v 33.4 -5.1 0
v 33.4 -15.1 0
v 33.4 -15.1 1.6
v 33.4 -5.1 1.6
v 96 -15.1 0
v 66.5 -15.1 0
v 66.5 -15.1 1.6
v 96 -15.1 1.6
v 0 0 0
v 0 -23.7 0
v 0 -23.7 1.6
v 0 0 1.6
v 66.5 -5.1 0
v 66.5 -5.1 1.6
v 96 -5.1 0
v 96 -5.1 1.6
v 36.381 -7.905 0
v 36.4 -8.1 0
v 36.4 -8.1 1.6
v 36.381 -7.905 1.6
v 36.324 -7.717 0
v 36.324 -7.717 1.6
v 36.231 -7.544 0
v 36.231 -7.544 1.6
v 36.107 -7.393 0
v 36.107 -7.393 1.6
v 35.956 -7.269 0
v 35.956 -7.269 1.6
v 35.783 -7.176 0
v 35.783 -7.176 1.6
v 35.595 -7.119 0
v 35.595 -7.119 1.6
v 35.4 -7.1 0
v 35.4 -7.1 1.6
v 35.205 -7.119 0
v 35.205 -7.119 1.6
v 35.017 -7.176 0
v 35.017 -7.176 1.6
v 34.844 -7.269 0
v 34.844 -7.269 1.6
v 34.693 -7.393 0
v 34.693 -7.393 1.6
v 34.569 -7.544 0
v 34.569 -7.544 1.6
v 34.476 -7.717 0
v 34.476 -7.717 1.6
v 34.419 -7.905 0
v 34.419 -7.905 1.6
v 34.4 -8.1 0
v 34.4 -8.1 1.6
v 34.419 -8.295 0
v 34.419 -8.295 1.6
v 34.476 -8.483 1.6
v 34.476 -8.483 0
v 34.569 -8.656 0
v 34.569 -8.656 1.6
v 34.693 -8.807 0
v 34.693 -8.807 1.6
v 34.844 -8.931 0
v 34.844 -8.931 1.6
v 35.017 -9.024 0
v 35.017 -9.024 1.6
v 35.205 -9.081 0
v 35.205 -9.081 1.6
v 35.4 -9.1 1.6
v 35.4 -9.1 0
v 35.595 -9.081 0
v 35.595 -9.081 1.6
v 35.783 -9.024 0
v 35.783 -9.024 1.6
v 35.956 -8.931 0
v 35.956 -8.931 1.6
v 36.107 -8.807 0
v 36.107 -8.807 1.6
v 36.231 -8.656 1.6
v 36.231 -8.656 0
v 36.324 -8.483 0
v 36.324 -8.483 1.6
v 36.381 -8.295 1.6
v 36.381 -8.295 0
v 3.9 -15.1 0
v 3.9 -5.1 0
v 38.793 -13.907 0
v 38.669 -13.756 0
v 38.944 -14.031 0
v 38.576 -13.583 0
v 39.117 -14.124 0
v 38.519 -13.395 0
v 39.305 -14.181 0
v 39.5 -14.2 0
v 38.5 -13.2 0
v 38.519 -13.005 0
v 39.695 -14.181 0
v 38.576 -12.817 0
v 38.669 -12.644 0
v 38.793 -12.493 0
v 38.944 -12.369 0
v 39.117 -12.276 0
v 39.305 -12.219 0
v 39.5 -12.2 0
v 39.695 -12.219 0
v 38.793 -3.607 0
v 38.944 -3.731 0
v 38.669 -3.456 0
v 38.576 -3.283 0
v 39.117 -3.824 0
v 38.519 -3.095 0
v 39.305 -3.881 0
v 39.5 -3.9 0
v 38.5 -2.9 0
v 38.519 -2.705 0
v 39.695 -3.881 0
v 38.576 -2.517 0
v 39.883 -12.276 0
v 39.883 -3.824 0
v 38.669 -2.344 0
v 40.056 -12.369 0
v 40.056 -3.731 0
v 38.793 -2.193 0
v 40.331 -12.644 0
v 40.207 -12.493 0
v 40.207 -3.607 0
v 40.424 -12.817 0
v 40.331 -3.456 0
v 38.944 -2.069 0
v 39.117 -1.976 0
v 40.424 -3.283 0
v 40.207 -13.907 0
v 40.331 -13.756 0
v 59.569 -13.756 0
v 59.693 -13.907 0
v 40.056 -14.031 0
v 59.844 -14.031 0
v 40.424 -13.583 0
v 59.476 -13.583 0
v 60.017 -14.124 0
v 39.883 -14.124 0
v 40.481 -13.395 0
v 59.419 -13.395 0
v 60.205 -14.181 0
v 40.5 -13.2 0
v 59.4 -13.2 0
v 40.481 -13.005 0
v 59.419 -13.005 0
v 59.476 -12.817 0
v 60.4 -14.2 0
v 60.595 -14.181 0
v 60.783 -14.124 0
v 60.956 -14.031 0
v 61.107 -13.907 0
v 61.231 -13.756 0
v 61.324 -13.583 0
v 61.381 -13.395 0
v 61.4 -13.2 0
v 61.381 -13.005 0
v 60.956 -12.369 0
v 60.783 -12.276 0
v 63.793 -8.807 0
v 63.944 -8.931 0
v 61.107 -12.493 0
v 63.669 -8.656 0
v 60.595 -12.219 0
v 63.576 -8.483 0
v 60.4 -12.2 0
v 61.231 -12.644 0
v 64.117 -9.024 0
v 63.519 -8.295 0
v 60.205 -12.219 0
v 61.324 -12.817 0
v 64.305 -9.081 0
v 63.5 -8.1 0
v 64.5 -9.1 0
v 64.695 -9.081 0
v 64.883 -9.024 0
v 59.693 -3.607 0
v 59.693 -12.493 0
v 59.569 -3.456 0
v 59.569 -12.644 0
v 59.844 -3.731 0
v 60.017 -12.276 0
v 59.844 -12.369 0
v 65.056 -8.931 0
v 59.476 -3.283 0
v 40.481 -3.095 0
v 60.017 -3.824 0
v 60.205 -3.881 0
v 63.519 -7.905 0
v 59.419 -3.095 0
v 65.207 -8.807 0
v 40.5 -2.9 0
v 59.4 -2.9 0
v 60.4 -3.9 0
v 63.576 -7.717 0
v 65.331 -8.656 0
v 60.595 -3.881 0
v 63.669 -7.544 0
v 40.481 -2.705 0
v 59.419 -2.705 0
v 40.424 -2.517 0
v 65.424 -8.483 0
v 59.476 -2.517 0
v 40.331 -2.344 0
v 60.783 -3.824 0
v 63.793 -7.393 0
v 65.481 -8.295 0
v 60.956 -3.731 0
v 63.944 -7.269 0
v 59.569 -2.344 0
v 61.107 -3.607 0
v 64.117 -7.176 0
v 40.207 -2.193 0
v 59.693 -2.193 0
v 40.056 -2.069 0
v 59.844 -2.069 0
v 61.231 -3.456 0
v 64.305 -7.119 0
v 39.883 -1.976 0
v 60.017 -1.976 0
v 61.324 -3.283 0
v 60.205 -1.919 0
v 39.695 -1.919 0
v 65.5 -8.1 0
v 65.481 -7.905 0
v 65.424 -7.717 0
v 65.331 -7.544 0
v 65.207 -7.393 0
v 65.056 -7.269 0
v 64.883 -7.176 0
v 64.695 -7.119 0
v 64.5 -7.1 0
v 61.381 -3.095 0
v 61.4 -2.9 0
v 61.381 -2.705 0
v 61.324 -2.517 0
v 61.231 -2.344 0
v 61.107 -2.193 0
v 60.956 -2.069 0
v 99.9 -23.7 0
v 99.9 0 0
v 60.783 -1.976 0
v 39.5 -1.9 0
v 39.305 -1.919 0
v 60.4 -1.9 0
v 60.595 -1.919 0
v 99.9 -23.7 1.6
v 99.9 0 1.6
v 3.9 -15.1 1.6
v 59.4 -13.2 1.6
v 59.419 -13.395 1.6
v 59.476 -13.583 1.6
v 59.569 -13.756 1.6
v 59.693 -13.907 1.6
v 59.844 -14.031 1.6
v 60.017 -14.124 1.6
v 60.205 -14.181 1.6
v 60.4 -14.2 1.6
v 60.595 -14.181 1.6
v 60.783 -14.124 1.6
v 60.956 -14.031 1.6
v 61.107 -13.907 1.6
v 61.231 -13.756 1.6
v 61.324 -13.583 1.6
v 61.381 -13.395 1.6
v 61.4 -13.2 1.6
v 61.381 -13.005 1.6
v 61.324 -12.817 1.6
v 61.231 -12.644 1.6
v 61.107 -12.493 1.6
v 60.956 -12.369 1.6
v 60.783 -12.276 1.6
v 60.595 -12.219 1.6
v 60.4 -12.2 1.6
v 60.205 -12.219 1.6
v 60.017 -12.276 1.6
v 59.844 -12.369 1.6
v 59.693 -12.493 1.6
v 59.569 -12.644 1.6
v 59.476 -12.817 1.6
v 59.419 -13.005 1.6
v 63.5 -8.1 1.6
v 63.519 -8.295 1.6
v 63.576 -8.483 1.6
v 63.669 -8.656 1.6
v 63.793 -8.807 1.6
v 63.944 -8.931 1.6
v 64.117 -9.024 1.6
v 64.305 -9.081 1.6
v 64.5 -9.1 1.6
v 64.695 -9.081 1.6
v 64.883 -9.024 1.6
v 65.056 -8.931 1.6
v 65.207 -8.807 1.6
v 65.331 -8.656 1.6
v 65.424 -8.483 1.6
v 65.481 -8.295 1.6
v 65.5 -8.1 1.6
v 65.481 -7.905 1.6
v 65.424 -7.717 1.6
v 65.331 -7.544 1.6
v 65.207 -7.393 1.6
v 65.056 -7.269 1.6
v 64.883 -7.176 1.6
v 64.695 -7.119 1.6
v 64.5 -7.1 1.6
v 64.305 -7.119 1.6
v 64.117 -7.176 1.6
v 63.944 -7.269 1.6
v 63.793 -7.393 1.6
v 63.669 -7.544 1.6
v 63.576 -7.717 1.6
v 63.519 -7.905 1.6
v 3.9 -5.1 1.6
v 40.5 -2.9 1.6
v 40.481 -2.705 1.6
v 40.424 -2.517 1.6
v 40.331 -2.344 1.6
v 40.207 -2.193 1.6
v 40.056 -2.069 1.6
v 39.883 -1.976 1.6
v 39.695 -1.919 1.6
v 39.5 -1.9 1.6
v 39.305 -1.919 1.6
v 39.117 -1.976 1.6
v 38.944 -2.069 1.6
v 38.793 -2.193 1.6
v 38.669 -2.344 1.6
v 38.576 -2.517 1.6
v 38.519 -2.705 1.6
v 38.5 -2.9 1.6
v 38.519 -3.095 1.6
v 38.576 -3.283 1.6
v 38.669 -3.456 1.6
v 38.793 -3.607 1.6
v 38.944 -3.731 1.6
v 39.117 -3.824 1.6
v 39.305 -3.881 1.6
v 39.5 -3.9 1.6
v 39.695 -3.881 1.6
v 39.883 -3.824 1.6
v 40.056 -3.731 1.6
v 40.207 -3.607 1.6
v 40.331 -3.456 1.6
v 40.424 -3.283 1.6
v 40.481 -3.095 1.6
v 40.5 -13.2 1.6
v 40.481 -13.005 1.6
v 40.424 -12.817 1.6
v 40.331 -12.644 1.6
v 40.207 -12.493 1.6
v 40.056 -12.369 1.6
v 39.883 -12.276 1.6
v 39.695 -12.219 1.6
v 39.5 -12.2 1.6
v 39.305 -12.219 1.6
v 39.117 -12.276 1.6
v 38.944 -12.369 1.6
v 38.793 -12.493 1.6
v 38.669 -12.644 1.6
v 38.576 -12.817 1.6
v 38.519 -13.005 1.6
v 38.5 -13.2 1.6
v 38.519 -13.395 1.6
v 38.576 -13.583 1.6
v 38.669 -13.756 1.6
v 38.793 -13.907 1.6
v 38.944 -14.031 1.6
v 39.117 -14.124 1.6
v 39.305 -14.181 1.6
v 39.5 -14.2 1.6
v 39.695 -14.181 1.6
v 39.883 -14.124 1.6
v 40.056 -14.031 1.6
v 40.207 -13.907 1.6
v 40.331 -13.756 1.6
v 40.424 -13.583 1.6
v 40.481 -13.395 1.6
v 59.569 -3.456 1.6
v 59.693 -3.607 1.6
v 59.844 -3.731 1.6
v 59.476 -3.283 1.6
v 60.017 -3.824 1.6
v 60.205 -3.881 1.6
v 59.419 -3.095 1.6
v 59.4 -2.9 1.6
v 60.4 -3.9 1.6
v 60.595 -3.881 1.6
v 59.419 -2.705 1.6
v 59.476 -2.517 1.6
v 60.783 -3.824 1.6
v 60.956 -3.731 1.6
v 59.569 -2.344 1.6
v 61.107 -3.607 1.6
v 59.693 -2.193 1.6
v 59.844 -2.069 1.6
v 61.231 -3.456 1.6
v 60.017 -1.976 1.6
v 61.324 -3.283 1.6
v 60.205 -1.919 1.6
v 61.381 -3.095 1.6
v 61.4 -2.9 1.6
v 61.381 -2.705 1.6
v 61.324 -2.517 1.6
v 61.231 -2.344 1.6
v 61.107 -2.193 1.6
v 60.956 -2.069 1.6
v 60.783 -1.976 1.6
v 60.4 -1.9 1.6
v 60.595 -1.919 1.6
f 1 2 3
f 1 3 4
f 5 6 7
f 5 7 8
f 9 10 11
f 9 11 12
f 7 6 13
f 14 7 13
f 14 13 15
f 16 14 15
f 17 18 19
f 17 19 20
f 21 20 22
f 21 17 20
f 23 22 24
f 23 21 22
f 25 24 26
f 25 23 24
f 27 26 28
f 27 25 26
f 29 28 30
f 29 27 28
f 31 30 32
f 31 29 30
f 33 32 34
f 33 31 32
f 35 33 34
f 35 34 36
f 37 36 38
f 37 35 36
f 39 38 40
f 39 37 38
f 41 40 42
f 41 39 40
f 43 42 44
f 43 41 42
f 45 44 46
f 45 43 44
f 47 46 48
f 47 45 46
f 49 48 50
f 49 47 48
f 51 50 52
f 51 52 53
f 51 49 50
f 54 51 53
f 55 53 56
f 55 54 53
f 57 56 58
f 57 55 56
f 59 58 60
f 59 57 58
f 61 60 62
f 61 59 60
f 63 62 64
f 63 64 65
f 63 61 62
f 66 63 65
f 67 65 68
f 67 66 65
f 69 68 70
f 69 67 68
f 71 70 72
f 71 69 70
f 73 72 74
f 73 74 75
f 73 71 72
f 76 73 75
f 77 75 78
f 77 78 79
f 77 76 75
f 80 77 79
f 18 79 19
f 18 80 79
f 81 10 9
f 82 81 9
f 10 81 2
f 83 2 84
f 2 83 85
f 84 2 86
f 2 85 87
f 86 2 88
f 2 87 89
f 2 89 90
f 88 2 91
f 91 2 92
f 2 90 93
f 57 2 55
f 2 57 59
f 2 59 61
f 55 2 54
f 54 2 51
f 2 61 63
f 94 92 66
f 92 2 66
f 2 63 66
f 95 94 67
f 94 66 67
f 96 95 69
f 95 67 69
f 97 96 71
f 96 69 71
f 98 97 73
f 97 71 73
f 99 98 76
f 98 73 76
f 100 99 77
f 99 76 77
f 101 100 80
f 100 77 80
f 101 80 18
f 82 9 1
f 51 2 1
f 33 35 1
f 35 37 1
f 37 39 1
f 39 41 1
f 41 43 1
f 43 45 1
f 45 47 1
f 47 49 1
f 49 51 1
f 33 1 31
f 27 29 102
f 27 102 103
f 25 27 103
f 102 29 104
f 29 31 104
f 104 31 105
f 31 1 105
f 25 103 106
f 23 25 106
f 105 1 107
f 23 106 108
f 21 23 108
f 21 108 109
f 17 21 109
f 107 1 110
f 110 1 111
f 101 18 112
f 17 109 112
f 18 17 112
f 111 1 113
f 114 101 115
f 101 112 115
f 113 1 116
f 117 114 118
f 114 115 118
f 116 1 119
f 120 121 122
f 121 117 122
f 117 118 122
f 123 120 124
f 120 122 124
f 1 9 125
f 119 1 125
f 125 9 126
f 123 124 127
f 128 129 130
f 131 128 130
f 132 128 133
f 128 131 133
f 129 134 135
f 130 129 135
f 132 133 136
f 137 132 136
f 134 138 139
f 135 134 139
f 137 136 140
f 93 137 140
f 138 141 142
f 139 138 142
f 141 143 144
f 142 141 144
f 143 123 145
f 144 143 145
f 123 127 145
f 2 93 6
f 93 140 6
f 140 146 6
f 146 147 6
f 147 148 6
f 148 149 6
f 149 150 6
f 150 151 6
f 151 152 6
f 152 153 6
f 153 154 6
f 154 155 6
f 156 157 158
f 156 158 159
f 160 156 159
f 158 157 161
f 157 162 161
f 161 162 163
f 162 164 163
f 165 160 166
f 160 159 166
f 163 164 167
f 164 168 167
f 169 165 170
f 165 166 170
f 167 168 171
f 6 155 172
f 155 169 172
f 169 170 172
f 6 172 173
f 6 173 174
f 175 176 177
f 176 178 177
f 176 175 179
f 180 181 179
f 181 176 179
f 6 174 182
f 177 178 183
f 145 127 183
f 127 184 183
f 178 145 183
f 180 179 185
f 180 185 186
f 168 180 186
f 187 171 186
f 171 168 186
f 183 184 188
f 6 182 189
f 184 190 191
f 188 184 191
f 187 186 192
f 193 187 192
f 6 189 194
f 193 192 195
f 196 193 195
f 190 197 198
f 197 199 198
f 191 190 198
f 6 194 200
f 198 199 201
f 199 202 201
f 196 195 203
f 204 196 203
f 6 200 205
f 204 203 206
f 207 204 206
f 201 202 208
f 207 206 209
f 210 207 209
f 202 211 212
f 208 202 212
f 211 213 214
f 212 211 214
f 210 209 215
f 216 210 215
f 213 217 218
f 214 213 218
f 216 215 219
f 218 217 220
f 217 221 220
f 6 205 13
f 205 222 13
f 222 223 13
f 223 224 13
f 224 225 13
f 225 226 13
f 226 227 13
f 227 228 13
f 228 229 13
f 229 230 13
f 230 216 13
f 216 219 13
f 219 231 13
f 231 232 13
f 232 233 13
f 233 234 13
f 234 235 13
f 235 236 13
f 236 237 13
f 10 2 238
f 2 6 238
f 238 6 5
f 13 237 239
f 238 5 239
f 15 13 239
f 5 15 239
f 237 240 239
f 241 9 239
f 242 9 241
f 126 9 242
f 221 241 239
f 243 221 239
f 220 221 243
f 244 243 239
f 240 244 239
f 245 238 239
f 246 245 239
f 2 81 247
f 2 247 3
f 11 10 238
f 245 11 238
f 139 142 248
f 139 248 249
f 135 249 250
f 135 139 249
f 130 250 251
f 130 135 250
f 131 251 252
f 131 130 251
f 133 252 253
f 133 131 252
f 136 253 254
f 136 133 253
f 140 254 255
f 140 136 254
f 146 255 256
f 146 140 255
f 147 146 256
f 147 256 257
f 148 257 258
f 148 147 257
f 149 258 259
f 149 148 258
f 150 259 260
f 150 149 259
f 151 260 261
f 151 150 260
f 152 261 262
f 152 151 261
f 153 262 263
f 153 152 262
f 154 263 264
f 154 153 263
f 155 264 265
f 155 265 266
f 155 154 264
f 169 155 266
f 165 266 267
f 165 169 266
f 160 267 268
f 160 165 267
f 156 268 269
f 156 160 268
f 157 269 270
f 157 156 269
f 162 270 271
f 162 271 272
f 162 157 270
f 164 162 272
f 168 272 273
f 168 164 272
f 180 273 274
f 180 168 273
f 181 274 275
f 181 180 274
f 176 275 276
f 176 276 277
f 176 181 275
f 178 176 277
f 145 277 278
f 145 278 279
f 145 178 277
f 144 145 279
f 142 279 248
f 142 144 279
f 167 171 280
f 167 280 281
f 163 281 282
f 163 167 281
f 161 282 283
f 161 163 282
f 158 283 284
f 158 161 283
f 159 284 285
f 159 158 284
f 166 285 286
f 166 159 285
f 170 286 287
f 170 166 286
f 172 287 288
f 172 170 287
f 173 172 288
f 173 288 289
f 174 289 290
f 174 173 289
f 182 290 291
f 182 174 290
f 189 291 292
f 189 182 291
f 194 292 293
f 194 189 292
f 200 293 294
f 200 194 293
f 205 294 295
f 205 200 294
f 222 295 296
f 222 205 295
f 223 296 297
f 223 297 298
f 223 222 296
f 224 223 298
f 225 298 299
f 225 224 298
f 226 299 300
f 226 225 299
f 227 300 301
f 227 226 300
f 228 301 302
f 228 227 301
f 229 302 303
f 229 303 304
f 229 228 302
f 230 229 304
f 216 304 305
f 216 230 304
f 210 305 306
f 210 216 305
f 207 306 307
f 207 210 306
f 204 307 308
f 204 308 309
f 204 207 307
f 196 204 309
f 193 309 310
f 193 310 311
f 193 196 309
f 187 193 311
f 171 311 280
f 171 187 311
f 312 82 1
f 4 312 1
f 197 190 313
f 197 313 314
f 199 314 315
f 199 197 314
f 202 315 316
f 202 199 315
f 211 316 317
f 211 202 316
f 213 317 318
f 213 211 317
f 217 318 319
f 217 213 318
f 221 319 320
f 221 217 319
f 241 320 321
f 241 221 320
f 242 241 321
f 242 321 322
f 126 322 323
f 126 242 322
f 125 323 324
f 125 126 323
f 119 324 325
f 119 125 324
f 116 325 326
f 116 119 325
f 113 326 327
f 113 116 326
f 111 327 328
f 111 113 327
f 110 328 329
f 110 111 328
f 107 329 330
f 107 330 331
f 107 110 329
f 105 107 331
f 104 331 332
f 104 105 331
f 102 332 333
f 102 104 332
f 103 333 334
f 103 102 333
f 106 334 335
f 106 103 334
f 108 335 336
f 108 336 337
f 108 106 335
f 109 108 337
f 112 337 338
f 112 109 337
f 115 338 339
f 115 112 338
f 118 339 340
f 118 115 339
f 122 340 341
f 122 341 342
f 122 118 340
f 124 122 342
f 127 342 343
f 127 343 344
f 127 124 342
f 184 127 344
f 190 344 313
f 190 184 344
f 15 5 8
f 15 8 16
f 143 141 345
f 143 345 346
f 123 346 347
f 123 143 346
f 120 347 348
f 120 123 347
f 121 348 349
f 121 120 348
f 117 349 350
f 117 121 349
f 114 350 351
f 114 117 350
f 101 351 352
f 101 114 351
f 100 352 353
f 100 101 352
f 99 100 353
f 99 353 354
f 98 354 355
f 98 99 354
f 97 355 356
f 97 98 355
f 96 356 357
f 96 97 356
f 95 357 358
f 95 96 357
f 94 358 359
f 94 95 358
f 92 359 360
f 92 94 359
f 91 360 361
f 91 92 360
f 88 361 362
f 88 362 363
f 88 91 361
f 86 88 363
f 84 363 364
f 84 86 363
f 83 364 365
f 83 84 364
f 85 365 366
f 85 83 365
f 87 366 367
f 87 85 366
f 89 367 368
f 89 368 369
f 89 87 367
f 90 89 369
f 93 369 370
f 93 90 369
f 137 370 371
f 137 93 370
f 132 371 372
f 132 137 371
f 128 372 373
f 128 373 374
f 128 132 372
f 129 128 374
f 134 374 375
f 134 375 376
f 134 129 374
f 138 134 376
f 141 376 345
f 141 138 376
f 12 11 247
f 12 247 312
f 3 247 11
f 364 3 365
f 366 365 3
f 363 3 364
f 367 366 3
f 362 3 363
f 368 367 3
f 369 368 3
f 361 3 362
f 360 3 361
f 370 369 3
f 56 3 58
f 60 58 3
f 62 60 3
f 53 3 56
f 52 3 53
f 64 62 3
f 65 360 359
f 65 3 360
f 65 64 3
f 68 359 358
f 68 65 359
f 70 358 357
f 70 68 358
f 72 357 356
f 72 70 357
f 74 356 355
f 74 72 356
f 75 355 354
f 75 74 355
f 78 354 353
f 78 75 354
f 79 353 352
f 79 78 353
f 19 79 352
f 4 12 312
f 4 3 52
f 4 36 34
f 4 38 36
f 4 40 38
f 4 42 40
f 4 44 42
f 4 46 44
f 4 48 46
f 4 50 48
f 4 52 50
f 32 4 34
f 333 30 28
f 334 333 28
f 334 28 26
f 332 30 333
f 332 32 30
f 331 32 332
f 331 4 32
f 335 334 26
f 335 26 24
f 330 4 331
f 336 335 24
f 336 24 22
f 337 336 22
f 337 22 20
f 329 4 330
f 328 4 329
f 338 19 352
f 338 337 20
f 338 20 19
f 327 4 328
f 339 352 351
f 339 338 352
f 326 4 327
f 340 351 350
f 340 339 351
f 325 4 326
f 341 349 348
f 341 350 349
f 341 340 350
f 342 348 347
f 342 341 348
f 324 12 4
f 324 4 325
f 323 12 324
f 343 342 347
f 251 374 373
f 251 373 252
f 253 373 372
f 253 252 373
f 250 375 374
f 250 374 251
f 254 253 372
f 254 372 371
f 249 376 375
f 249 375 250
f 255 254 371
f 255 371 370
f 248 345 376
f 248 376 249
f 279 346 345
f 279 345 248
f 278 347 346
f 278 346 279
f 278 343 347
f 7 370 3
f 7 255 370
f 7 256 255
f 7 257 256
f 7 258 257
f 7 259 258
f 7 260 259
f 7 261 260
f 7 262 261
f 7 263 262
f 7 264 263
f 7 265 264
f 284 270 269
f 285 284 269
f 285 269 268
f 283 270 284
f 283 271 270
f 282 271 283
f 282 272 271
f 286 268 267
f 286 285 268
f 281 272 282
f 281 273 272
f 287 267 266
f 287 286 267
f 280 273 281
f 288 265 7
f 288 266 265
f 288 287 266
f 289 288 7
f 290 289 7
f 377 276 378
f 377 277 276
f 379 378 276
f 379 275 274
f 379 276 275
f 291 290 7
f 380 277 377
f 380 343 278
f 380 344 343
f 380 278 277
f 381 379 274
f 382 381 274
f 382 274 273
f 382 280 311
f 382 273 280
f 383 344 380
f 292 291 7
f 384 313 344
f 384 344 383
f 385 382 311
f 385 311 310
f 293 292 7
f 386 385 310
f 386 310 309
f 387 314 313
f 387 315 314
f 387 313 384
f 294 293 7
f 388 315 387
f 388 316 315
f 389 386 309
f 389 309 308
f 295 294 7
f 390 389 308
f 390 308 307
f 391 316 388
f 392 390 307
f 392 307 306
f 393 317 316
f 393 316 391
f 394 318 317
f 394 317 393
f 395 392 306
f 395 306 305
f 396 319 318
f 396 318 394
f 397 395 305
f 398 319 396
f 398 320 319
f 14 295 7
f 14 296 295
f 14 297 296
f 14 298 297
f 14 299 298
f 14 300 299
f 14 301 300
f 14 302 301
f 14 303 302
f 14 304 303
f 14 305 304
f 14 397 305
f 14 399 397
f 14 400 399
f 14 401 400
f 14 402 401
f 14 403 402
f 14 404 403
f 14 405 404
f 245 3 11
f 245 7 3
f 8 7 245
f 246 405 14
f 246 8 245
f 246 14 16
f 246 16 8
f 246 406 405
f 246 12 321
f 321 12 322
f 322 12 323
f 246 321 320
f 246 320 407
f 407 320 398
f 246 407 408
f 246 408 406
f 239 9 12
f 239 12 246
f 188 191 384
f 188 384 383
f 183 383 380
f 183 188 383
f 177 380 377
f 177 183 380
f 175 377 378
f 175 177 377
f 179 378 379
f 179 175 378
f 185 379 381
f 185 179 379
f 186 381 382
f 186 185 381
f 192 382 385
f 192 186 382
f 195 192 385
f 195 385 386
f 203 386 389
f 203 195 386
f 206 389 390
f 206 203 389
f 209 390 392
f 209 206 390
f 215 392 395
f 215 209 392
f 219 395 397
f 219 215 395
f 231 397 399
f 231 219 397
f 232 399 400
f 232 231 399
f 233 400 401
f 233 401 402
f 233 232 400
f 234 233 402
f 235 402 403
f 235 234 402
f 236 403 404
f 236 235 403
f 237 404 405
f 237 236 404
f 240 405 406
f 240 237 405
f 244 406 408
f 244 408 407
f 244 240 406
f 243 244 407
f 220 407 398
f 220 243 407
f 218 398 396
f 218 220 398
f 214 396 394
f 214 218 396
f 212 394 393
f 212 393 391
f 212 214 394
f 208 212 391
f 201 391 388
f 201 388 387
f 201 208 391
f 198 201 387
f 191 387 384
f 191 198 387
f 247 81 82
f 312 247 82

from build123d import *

# Parameters (mm, degrees)
SKETCH_1_W      = 99.9
SKETCH_1_H      = 23.7
SKETCH_1_R      = 1
SKETCH_1_W_2    = 29.5
SKETCH_1_H_2    = 10
EXTRUDE_1_DEPTH = 1.6


with BuildPart() as part:
    # 草图1 → 凸台-拉伸1 (new body)
    with BuildSketch(Plane.XY):
        with Locations((49.95, -11.85)):
            Rectangle(SKETCH_1_W, SKETCH_1_H)
        with Locations((39.5, -2.9)):
            Circle(SKETCH_1_R, mode=Mode.SUBTRACT)
        with Locations((35.4, -8.1)):
            Circle(SKETCH_1_R, mode=Mode.SUBTRACT)
        with Locations((39.5, -13.2)):
            Circle(SKETCH_1_R, mode=Mode.SUBTRACT)
        with Locations(Location((60.4, -2.9, 0), (0, 0, 180))):
            Circle(SKETCH_1_R, mode=Mode.SUBTRACT)
        with Locations(Location((64.5, -8.1, 0), (0, 0, 180))):
            Circle(SKETCH_1_R, mode=Mode.SUBTRACT)
        with Locations(Location((60.4, -13.2, 0), (0, 0, 180))):
            Circle(SKETCH_1_R, mode=Mode.SUBTRACT)
        with Locations((18.65, -10.1)):
            Rectangle(SKETCH_1_W_2, SKETCH_1_H_2, mode=Mode.SUBTRACT)
        with Locations((81.25, -10.1)):
            Rectangle(SKETCH_1_W_2, SKETCH_1_H_2, mode=Mode.SUBTRACT)
    extrude(amount=EXTRUDE_1_DEPTH)


solid = part.part
